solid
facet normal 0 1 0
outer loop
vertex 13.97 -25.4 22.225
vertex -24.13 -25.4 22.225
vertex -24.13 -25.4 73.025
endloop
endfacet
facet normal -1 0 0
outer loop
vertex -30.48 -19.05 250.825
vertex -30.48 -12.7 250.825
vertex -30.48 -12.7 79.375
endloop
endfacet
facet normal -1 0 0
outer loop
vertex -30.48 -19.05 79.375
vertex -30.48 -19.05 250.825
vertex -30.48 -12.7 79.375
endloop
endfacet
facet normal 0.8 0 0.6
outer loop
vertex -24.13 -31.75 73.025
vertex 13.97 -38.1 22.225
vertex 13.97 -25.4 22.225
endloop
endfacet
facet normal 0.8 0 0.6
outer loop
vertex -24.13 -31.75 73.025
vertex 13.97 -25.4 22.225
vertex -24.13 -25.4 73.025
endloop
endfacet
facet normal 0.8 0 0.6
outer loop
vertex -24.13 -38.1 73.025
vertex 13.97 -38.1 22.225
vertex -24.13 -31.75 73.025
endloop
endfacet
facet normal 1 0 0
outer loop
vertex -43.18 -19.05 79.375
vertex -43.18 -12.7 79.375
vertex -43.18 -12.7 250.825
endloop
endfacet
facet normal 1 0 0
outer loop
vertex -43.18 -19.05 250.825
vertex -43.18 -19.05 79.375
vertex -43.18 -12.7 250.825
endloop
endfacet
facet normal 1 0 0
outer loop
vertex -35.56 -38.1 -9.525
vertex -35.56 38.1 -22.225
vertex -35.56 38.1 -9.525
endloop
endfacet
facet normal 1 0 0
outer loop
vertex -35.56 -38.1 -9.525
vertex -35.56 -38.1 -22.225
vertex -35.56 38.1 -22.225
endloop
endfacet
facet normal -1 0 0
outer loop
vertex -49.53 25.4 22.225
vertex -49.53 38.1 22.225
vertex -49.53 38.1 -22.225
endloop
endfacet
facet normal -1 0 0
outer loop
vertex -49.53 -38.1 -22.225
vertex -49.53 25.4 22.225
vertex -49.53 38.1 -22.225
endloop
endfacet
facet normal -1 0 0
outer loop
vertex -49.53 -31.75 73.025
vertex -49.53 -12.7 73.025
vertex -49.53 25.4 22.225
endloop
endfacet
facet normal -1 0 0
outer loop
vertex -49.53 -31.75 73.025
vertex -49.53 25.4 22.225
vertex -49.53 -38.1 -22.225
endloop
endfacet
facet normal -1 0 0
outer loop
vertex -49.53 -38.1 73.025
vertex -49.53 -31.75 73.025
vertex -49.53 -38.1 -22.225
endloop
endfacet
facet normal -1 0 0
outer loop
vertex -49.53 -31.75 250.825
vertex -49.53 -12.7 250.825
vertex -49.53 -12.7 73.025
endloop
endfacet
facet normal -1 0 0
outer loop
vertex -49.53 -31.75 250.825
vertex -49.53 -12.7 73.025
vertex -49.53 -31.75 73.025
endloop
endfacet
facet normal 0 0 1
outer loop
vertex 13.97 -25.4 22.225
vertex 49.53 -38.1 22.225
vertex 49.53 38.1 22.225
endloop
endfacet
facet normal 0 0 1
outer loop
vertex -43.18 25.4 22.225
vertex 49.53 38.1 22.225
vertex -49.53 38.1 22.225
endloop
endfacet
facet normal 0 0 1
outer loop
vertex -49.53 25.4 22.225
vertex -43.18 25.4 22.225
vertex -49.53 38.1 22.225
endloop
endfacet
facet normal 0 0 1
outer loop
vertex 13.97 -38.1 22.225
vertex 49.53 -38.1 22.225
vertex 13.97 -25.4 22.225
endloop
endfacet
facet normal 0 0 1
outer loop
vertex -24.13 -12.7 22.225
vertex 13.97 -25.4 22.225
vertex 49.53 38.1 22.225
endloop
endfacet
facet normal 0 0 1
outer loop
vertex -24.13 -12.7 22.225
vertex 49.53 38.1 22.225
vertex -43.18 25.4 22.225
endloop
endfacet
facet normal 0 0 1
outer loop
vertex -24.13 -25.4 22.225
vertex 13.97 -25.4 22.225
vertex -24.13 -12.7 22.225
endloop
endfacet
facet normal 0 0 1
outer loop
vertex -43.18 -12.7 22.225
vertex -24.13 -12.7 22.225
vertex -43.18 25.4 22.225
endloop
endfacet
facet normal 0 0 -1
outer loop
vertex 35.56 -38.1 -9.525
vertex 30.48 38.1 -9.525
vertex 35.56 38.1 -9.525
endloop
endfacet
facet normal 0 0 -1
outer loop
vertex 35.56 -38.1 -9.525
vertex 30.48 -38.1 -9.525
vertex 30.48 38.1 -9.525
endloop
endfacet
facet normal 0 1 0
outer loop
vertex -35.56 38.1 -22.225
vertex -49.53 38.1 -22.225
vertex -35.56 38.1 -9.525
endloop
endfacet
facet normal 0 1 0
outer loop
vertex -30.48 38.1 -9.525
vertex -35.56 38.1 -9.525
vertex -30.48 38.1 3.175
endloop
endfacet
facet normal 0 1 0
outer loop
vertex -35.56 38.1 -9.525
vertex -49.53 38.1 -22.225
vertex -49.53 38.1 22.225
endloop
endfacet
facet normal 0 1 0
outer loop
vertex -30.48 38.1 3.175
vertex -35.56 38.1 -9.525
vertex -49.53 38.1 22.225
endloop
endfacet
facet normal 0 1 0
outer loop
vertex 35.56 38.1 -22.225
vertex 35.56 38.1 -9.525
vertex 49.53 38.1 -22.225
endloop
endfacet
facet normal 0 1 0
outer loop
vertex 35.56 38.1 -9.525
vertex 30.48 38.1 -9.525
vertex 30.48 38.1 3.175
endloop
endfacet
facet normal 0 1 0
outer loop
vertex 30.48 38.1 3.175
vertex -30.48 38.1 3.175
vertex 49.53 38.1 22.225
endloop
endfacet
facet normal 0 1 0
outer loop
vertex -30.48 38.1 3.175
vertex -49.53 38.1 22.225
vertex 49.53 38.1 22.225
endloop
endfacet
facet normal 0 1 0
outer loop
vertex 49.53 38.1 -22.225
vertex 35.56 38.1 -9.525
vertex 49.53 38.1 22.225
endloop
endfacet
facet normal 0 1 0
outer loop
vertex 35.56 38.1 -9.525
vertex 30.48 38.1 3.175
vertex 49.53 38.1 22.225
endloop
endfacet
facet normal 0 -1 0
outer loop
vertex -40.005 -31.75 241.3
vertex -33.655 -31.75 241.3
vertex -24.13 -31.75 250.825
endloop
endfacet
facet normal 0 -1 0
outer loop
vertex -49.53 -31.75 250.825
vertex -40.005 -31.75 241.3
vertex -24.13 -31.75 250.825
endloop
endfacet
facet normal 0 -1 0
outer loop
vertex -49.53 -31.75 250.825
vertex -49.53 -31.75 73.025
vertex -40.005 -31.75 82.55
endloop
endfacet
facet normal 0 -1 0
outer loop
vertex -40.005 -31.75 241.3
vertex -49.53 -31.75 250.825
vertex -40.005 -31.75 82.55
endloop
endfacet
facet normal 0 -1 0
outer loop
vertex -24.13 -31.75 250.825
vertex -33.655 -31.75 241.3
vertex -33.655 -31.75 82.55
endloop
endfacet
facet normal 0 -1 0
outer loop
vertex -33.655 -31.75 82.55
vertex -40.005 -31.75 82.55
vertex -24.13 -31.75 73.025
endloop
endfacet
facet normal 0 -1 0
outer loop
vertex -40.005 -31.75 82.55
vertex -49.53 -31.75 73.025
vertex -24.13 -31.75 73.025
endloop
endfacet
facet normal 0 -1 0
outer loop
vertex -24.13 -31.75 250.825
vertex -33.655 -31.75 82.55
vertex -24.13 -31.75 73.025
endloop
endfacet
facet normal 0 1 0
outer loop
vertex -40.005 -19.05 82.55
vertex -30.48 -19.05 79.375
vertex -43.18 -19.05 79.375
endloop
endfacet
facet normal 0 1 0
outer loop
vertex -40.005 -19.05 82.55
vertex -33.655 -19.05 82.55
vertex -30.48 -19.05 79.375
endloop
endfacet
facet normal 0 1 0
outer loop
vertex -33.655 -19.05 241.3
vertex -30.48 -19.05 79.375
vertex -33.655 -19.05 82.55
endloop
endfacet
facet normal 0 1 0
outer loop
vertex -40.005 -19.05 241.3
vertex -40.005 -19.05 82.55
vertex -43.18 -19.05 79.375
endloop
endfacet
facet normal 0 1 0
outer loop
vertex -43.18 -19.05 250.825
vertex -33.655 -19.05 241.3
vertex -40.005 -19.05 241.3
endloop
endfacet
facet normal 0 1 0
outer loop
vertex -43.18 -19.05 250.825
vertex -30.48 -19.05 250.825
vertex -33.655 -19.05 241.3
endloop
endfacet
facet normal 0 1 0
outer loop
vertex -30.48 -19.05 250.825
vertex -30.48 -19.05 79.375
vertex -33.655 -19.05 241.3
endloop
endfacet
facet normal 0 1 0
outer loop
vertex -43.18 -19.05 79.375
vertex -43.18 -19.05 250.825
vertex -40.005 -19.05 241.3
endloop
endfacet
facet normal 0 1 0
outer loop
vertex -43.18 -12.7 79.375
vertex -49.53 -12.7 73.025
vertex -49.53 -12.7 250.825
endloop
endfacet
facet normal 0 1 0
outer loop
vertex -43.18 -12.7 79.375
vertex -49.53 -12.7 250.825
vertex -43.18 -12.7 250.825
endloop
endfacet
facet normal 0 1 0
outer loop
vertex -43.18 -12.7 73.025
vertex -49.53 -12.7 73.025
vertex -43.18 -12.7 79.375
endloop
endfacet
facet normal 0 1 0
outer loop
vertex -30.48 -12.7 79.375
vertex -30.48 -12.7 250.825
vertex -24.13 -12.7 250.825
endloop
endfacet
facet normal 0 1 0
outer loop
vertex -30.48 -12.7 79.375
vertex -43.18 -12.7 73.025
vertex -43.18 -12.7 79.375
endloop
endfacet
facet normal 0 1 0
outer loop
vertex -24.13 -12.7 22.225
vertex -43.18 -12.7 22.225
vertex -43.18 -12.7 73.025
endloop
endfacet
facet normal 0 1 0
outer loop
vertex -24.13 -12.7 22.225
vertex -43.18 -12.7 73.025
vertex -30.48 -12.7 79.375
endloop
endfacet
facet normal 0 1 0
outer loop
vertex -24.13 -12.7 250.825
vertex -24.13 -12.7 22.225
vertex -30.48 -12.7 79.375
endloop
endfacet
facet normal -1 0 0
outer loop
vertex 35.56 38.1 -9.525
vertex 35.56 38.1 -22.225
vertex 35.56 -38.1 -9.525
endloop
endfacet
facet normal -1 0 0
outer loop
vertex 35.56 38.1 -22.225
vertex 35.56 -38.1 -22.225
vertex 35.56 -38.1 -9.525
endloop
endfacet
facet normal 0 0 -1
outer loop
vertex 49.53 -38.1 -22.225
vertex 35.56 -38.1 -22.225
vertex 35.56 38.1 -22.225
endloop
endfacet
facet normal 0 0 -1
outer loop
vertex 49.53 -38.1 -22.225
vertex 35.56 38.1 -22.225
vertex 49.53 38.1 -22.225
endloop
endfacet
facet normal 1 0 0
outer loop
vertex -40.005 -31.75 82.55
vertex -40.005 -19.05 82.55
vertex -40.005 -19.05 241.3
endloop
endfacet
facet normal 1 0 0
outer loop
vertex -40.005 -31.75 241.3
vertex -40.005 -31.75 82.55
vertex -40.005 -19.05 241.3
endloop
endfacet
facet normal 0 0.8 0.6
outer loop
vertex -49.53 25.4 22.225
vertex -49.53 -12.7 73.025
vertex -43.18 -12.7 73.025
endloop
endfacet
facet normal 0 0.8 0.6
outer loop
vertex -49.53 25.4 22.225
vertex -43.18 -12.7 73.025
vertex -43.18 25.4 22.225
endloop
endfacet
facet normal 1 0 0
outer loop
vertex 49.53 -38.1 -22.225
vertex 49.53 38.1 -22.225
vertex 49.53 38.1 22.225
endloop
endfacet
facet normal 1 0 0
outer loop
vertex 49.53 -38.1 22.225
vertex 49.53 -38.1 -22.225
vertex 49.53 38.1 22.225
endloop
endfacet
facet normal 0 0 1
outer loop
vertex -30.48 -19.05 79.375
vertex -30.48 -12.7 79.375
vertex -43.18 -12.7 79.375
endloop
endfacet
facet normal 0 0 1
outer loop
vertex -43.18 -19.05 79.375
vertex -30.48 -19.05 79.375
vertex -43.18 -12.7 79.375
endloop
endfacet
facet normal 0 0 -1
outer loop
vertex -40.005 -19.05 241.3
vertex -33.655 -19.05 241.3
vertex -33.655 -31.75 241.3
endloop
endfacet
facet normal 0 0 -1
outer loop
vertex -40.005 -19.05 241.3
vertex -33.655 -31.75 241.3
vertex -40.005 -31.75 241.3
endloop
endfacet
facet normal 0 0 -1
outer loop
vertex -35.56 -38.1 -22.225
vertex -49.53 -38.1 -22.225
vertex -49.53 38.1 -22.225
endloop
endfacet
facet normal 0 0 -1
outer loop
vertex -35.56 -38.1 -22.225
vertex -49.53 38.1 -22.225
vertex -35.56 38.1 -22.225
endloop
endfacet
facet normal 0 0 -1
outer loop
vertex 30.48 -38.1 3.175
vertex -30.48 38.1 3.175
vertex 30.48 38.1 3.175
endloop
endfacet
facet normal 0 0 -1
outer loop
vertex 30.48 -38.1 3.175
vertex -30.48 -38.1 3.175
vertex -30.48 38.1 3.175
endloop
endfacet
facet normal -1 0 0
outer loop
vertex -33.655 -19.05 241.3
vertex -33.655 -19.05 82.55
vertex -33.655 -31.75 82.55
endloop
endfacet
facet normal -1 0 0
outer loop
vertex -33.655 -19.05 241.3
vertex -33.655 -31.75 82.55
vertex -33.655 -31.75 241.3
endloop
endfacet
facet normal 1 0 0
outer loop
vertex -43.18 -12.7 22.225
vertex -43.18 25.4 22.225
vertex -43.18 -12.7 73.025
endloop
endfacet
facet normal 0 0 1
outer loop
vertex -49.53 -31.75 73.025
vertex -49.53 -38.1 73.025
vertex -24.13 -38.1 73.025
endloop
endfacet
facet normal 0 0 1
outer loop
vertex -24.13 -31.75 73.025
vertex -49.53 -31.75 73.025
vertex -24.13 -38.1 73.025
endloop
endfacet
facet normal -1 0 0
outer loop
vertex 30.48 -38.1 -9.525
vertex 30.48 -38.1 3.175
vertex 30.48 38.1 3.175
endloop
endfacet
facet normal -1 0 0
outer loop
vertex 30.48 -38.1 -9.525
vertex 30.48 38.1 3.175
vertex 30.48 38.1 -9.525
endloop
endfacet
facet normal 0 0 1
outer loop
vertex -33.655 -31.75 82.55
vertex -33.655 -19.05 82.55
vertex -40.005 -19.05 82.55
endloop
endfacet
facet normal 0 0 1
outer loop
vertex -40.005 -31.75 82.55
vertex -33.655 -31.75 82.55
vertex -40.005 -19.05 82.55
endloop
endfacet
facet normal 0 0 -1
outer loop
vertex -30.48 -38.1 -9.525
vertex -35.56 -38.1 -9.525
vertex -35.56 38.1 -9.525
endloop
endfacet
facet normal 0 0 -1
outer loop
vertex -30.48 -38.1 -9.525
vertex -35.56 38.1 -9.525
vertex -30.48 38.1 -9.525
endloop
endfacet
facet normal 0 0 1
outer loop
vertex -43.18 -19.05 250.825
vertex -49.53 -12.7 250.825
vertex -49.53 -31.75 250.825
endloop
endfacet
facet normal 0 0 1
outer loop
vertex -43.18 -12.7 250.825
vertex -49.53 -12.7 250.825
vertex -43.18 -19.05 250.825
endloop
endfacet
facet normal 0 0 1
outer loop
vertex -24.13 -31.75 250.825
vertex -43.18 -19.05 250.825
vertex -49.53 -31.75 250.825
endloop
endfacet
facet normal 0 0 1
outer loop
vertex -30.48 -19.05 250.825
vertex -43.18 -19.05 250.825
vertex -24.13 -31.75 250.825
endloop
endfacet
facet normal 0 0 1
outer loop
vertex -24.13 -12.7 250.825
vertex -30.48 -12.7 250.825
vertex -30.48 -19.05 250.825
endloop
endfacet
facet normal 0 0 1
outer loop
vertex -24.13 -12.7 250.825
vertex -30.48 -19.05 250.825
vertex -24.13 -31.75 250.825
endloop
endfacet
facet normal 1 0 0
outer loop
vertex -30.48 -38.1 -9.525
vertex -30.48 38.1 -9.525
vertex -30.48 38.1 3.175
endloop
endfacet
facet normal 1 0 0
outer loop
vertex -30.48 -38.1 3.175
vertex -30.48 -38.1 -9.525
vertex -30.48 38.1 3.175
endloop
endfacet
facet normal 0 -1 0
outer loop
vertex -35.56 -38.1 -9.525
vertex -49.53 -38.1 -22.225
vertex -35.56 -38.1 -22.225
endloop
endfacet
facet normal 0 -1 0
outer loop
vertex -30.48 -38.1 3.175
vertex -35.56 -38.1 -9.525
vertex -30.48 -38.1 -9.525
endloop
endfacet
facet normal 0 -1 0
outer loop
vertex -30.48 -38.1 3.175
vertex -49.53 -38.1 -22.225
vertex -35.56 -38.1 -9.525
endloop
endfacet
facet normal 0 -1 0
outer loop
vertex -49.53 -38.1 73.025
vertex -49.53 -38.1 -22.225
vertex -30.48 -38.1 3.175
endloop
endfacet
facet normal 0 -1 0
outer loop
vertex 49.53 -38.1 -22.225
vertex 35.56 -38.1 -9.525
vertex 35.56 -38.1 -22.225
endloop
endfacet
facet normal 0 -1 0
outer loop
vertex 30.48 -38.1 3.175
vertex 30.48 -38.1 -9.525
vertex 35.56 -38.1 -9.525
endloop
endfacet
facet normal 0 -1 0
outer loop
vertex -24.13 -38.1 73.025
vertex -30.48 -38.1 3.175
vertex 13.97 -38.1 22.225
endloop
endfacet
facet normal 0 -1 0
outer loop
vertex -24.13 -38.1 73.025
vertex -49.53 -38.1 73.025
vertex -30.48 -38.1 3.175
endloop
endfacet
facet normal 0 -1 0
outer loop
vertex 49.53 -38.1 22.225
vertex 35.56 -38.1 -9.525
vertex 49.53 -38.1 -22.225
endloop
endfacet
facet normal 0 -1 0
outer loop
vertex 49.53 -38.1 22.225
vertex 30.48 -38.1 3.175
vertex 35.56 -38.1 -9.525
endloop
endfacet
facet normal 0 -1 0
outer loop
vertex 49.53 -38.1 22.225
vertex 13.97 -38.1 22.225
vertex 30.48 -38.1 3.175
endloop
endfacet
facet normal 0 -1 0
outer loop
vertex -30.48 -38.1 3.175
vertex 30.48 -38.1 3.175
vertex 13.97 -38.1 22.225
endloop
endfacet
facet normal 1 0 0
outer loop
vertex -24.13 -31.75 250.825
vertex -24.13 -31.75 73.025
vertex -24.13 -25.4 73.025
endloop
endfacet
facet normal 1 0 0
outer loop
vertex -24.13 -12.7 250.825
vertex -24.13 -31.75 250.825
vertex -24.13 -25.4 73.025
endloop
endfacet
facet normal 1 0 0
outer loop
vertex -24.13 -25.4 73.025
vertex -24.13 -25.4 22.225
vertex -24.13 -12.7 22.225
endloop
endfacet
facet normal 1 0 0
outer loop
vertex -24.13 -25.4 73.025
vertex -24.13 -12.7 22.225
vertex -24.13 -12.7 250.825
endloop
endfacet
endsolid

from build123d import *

# Parameters (mm, degrees)
F1_DEPTH  = 38.1
F2_W      = 71.12
F2_H      = 27.39084
F3_DEPTH  = 50.8
F4_W      = 25.4
F4_H      = 19.05
F5_DEPTH  = 228.6
F6_W      = 25.4
F6_H      = 50.8
F7_DEPTH  = 12.7
F9_DEPTH  = 6.35
F10_W     = 12.7
F10_H     = 165.1
F11_DEPTH = 6.35
F12_W     = 6.35
F12_H     = 158.75
F13_DEPTH = 25.4
F14_W     = 12.7
F14_H     = 25.4
F14_H_2   = 6.35
F15_DEPTH = 6.35


with BuildPart() as f1:
    # F0 (on Front) → F1 (new body, symmetric)
    with BuildSketch(Plane.XZ):
        Polygon((30.48, -22.225), (49.53, -22.225), (49.53, 22.225), (-49.53, 22.225), (-49.53, -22.225), (-30.48, -22.225), (-30.48, 3.175), (30.48, 3.175), align=None)
    extrude(amount=F1_DEPTH, both=True)

    # F2 (on Front) → F3 (cut, symmetric)
    with BuildSketch(Plane.XZ):
        with Locations((0, -23.22042)):
            Rectangle(F2_W, F2_H)
    extrude(amount=F3_DEPTH, both=True, mode=Mode.SUBTRACT)

    # F4 (on face) → F5 (join)
    with BuildSketch(Plane.XY.offset(22.225)):
        with Locations((-36.83, -22.225)):
            Rectangle(F4_W, F4_H)
    extrude(amount=F5_DEPTH)

    # F6 (on face) → F7 (join)
    with BuildSketch(Plane.XZ.offset(38.1)):
        with Locations((-36.83, 47.625)):
            Rectangle(F6_W, F6_H)
        Polygon((-24.13, 73.025), (-24.13, 22.225), (13.97, 22.225), align=None)
    extrude(amount=-F7_DEPTH)

    # F8 (on face) → F9 (join)
    with BuildSketch(Plane(origin=(-49.53, 0, 0), x_dir=(0, -1, 0), z_dir=(-1, 0, 0))):
        Polygon((-25.4, 22.225), (12.7, 22.225), (12.7, 73.025), align=None)
    extrude(amount=-F9_DEPTH)

    # F10 (on face) → F11 (cut)
    with BuildSketch(Plane(origin=(0, -12.7, 0), x_dir=(-1, 0, 0), z_dir=(0, 1, 0))):
        with Locations((36.83, 161.925)):
            Rectangle(F10_W, F10_H)
    extrude(amount=-F11_DEPTH, mode=Mode.SUBTRACT)

    # F12 (on face) → F13 (cut)
    with BuildSketch(Plane(origin=(0, -19.05, 0), x_dir=(-1, 0, 0), z_dir=(0, 1, 0))):
        with Locations((36.83, 161.925)):
            Rectangle(F12_W, F12_H)
    extrude(amount=-F13_DEPTH, mode=Mode.SUBTRACT)

    # F14 (on face) → F15 (cut)
    with BuildSketch(Plane(origin=(0, -12.7, 0), x_dir=(-1, 0, 0), z_dir=(0, 1, 0))):
        with Locations((36.83, 250.825)):
            Rectangle(F14_W, F14_H)
        with Locations((36.83, 241.3)):
            Rectangle(F14_W, F14_H_2)
    extrude(amount=-F15_DEPTH, mode=Mode.SUBTRACT)


solid = f1.part
